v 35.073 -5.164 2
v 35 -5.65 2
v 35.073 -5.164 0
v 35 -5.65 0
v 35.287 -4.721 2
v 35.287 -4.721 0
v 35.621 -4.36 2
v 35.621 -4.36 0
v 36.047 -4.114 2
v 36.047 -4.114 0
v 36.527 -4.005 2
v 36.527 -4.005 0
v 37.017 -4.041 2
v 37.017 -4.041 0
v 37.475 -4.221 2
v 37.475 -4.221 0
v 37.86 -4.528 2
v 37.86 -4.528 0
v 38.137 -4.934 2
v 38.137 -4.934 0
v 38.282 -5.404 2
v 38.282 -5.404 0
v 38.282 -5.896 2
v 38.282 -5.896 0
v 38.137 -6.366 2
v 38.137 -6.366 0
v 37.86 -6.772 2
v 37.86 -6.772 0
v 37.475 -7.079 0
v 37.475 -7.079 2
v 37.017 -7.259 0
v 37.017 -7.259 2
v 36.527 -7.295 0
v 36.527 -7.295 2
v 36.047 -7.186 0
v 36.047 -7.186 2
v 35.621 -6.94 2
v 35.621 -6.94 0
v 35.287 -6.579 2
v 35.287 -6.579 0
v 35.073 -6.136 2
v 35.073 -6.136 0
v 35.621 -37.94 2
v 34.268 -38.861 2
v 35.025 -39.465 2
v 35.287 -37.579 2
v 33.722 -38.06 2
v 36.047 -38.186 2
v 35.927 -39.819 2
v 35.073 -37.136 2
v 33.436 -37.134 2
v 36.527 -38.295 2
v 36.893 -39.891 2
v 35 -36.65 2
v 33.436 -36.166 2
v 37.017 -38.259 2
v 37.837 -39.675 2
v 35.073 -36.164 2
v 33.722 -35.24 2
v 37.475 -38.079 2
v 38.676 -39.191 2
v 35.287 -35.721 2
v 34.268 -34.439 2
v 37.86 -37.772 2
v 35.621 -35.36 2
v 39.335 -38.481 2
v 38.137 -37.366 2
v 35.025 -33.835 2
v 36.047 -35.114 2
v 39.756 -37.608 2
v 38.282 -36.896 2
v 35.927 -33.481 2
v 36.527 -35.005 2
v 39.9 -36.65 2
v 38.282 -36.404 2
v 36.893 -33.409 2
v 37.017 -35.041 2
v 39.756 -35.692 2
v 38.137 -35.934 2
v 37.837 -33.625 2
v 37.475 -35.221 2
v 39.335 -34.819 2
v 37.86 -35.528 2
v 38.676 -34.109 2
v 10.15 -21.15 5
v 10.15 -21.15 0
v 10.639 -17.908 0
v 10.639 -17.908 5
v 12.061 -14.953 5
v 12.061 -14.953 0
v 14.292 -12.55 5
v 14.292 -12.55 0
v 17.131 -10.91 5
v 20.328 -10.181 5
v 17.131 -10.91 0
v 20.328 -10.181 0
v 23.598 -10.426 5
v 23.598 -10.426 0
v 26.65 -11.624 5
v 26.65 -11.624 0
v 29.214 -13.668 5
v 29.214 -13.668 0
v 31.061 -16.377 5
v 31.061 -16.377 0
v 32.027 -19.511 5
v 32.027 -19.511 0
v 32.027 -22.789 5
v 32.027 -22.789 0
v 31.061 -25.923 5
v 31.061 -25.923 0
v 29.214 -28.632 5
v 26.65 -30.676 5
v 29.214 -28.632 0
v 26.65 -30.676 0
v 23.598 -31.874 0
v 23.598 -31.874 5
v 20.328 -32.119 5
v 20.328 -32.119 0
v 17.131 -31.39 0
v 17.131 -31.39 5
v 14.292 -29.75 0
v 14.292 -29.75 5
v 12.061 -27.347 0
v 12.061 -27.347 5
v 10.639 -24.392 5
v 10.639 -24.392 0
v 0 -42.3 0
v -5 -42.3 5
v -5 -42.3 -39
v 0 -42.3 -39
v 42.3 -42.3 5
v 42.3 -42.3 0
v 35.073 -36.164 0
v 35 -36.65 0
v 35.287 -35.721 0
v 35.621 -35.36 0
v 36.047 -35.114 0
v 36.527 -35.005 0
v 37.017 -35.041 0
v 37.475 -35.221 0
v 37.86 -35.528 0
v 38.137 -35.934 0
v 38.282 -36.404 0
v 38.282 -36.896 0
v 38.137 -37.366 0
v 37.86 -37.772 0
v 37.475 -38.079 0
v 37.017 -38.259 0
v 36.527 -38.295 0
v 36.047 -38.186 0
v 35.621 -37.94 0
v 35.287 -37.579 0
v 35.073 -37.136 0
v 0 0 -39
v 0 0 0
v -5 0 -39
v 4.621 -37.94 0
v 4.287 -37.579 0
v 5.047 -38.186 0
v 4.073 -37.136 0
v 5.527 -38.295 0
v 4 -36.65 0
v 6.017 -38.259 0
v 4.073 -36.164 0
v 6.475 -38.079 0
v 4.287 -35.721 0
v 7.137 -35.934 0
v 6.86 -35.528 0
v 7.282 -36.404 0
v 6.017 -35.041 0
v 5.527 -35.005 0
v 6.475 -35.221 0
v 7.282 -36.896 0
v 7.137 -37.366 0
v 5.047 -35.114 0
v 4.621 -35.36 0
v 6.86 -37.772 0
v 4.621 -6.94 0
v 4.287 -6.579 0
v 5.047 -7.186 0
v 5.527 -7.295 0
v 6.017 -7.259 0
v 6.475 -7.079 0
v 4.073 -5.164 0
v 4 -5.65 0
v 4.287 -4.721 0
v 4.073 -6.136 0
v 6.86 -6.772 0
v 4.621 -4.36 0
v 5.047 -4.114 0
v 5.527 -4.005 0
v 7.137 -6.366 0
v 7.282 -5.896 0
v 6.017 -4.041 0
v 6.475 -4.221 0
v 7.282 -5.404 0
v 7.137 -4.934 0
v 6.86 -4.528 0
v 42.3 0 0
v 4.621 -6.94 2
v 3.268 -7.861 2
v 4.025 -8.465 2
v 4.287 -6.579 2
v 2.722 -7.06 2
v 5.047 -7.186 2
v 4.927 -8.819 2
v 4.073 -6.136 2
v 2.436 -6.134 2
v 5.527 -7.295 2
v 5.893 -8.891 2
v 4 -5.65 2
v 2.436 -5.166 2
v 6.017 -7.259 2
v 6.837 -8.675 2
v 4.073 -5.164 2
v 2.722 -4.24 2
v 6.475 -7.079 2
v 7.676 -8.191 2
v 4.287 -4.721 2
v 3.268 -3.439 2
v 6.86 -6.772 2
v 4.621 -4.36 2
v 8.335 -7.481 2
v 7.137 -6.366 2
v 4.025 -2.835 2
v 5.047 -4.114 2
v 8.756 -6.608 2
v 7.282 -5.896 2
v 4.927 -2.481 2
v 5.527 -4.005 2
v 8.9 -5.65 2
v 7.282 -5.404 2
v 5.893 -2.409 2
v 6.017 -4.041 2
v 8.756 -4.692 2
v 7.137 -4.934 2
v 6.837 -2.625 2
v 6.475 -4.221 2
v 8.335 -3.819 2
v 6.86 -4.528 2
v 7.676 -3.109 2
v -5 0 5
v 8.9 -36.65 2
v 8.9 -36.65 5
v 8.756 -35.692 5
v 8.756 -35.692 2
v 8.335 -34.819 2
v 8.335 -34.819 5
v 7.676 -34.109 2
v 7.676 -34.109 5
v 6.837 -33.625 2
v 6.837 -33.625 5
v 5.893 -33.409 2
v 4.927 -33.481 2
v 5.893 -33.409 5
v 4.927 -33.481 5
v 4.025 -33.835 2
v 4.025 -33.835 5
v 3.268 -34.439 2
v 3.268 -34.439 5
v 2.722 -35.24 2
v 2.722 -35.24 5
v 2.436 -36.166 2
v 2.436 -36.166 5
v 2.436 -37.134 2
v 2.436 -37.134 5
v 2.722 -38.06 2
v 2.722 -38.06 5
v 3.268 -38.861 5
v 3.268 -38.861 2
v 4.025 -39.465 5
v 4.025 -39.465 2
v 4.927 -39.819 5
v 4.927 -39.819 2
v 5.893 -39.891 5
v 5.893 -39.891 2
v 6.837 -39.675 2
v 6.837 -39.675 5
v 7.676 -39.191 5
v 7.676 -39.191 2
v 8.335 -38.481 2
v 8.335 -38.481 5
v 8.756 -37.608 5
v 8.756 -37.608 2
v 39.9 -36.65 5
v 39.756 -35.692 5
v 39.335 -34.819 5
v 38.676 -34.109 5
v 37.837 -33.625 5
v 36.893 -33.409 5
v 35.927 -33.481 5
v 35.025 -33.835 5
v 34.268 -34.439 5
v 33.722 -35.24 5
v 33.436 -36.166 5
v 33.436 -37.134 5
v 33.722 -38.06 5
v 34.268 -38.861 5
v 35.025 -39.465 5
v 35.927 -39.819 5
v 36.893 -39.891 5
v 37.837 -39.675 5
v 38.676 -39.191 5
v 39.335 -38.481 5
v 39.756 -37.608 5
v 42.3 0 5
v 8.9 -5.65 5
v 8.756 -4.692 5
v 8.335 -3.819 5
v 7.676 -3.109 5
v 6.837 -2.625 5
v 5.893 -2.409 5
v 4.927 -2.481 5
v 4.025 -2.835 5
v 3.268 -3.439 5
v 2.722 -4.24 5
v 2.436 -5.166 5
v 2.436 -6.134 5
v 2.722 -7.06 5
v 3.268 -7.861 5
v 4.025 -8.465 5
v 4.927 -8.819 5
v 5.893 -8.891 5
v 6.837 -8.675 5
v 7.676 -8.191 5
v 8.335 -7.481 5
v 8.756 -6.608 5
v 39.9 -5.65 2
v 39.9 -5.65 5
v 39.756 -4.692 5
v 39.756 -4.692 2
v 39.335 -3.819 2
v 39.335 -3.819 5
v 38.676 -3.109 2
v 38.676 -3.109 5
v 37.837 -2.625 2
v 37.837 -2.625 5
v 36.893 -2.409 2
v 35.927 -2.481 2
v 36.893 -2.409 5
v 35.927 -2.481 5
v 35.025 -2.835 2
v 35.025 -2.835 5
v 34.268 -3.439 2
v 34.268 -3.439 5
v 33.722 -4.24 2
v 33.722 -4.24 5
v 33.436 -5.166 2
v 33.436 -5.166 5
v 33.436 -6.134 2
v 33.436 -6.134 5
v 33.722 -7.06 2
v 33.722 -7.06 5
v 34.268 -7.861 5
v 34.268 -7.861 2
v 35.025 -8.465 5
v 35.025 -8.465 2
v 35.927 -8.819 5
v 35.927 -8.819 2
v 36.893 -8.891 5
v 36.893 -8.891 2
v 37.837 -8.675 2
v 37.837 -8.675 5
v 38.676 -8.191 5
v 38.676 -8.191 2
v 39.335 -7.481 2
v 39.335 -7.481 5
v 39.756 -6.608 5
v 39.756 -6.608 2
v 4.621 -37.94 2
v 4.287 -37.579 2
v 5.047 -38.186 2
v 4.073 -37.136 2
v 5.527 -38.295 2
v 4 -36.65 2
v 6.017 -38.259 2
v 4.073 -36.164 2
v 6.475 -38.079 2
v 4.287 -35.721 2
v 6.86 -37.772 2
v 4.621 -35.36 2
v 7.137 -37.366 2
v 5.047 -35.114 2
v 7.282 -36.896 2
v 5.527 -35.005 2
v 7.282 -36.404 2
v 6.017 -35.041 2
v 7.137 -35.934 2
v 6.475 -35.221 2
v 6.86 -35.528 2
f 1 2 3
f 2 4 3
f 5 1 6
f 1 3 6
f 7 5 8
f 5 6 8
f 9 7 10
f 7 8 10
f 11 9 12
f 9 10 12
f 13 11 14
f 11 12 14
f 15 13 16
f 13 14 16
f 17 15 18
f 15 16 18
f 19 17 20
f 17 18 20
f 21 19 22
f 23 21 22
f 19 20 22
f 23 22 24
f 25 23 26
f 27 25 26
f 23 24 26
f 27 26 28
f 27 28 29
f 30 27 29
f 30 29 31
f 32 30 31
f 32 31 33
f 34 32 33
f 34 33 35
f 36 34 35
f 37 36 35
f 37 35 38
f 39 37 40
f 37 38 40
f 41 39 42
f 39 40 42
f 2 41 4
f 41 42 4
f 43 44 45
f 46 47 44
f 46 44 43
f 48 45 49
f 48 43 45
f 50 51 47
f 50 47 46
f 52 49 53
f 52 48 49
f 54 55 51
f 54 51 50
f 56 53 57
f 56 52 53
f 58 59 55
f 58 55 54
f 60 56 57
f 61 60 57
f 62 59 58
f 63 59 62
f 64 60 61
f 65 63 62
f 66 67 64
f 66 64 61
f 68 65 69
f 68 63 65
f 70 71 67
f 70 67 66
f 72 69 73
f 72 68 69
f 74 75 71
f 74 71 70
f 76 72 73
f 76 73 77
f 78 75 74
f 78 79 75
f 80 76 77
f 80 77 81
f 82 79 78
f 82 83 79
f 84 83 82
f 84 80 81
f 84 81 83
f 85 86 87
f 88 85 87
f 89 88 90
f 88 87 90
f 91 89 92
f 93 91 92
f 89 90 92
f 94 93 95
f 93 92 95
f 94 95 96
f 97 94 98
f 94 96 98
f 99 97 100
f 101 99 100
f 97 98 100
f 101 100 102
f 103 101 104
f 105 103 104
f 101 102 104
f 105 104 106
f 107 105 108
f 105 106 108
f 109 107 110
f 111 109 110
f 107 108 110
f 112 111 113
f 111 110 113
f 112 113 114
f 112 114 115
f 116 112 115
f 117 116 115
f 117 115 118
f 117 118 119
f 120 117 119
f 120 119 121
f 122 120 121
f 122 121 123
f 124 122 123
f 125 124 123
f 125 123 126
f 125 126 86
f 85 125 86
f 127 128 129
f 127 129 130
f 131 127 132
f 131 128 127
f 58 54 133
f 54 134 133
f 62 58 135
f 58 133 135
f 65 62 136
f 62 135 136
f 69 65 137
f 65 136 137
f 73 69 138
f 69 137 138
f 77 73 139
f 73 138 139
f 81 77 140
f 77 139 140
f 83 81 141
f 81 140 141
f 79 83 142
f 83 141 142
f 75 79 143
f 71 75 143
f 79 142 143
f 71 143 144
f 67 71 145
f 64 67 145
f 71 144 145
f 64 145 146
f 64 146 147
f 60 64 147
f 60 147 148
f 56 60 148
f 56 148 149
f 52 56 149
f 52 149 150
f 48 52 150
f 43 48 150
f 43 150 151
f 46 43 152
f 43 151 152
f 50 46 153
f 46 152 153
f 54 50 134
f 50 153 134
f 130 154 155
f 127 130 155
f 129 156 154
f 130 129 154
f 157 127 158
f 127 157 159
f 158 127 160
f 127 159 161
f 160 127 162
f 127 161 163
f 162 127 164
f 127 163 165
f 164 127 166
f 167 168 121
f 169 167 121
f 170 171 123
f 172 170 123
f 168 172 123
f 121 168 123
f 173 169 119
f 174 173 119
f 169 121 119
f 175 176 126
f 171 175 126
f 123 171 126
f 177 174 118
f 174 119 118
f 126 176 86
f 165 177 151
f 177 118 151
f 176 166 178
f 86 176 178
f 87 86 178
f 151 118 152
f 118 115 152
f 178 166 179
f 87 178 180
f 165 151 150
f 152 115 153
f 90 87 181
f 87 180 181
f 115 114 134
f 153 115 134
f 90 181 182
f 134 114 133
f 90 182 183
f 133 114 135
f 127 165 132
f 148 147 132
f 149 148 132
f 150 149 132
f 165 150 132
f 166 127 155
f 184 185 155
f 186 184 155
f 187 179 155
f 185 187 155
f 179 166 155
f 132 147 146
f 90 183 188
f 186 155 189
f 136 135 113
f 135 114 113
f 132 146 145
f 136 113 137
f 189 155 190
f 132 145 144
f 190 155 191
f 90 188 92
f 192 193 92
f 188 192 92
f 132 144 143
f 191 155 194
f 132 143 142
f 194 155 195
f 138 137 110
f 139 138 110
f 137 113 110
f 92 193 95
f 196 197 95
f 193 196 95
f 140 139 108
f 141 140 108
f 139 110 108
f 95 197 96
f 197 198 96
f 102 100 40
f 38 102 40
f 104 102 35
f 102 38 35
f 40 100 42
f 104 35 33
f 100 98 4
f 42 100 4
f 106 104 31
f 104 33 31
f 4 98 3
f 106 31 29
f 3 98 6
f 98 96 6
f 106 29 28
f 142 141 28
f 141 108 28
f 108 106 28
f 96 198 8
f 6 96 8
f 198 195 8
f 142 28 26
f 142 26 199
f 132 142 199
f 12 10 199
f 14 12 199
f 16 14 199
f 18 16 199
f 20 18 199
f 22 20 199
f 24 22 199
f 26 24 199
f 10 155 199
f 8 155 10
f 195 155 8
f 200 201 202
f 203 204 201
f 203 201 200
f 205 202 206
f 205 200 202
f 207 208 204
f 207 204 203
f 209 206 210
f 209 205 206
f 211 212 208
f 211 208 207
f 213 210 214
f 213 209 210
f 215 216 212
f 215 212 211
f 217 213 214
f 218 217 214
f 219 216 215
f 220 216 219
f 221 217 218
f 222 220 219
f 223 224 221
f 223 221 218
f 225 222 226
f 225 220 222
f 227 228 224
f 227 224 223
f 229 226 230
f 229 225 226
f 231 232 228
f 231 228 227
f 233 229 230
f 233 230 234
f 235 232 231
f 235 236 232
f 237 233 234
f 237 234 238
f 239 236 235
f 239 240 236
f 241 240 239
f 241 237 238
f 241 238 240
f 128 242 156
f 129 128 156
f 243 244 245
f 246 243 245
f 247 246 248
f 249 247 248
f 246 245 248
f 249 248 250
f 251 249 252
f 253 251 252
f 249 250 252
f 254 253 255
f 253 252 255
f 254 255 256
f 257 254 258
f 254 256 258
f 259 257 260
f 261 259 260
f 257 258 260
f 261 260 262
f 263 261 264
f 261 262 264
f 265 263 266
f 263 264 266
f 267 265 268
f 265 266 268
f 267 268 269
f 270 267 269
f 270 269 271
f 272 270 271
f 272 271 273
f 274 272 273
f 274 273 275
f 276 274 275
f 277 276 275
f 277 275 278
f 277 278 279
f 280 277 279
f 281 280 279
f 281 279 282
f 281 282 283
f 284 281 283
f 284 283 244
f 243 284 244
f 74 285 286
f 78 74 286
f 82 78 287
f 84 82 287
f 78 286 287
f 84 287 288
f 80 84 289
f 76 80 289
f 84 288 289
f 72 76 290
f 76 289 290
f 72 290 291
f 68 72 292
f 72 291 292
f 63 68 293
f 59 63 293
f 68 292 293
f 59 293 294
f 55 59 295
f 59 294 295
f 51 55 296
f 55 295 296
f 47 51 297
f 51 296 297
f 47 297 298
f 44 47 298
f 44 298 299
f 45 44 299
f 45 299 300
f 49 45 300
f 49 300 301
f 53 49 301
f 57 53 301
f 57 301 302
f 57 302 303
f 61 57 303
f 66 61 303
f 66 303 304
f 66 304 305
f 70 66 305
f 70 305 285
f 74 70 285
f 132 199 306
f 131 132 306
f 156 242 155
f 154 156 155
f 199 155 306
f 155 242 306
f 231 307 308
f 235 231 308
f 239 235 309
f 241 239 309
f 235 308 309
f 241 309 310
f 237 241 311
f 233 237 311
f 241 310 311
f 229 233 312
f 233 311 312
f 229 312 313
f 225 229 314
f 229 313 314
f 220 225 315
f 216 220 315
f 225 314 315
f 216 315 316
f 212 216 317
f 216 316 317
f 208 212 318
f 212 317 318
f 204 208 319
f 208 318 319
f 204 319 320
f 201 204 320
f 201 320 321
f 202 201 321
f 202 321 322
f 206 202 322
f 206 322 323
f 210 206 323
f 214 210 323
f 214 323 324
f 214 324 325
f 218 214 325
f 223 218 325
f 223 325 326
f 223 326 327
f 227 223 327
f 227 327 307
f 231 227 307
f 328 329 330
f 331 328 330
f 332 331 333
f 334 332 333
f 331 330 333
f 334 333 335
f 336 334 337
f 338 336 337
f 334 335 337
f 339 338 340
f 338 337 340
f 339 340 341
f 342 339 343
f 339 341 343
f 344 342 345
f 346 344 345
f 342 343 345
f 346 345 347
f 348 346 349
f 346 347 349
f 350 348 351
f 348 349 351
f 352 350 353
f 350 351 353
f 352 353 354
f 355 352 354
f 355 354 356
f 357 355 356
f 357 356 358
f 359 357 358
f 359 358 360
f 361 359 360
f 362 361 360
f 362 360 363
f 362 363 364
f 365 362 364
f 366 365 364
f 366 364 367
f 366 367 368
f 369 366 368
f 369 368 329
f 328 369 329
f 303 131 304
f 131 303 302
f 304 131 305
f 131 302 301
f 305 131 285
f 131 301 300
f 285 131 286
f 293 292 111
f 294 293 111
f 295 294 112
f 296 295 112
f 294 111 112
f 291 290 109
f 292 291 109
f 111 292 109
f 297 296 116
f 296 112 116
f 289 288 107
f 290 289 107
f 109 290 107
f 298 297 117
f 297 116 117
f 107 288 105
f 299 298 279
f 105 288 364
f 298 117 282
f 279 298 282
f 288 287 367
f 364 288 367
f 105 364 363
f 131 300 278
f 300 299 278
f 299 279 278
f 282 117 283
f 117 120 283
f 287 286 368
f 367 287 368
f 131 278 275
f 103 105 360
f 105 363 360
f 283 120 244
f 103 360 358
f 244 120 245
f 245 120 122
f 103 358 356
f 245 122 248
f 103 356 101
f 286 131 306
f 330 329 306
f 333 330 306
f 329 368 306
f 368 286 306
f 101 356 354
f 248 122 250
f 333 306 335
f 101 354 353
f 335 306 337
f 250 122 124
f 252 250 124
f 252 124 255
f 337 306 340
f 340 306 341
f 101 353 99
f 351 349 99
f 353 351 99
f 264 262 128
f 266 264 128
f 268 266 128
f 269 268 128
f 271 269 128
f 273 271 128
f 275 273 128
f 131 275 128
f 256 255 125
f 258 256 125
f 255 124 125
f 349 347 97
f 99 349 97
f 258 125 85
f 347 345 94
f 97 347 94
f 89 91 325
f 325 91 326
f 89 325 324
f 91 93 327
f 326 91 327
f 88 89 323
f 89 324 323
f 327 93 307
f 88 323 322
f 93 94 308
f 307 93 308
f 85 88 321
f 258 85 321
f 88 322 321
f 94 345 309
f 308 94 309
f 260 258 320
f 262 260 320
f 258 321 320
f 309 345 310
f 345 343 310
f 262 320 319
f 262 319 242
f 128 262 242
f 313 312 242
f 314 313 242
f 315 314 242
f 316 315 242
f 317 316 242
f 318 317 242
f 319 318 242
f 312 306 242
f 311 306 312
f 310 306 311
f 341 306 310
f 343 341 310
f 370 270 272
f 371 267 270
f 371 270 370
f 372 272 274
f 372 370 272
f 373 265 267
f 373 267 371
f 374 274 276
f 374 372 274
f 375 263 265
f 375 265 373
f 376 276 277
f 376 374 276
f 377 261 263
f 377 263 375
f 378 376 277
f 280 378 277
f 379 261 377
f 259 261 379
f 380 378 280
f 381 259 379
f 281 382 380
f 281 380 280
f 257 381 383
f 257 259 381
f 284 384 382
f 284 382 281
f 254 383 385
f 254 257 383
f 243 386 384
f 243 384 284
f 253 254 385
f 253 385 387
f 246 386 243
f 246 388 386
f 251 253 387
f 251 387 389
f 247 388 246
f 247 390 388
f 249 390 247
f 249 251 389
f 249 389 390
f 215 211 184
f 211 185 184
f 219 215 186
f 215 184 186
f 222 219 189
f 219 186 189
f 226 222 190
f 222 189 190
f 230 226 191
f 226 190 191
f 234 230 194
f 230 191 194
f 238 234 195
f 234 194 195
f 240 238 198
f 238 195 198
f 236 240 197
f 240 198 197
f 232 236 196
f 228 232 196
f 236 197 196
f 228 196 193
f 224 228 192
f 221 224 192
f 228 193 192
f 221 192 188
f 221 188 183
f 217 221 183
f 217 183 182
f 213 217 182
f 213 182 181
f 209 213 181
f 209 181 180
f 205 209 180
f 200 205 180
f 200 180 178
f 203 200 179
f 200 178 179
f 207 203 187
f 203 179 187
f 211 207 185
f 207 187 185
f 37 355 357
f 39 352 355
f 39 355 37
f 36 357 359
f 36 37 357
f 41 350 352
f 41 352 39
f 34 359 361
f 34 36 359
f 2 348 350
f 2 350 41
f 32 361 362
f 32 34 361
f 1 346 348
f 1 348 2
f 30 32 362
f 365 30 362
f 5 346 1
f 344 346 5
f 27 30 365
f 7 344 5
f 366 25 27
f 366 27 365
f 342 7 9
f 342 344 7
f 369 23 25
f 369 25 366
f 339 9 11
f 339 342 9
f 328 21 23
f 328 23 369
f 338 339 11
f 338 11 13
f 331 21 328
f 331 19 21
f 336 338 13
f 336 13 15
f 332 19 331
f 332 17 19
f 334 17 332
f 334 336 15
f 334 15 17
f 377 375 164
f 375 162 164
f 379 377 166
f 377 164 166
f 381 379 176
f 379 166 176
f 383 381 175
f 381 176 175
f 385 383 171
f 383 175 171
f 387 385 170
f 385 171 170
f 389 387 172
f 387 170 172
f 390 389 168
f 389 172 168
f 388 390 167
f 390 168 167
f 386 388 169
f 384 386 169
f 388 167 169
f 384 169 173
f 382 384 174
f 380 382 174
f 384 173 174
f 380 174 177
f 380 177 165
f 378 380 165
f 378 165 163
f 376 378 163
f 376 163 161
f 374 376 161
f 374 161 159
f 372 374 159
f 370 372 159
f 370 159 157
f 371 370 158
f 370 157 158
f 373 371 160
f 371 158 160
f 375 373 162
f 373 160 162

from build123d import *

# Parameters (mm, degrees)
F1_DEPTH       = 42.3
F3_D           = 3.3
F3_DEPTH       = 10
F3_CBORE_D     = 6.5
F3_CBORE_DEPTH = 3
F3_TIP         = 0.9914200214
F4_D           = 22


with BuildPart() as f1:
    # F0 (on Front) → F1 (new body)
    with BuildSketch(Plane.XZ):
        Polygon((0, -39), (0, 0), (42.3, 0), (42.3, 5), (-5, 5), (-5, -39), align=None)
    extrude(amount=F1_DEPTH)

    # F3
    with Locations(Plane.XY.offset(5)):
        with Locations((5.65, -5.65), (36.65, -5.65), (36.65, -36.65), (5.65, -36.65)):
            CounterBoreHole(F3_D / 2, F3_CBORE_D / 2, F3_CBORE_DEPTH, depth=F3_DEPTH)
            with Locations((0, 0, -(F3_DEPTH + F3_TIP / 2))):  # 118° drill point
                Cone(0, F3_D / 2, F3_TIP, mode=Mode.SUBTRACT)

    # F4 (through all)
    with Locations(Plane.XY.offset(5)):
        with Locations((21.15, -21.15)):
            Hole(F4_D / 2)


solid = f1.part
